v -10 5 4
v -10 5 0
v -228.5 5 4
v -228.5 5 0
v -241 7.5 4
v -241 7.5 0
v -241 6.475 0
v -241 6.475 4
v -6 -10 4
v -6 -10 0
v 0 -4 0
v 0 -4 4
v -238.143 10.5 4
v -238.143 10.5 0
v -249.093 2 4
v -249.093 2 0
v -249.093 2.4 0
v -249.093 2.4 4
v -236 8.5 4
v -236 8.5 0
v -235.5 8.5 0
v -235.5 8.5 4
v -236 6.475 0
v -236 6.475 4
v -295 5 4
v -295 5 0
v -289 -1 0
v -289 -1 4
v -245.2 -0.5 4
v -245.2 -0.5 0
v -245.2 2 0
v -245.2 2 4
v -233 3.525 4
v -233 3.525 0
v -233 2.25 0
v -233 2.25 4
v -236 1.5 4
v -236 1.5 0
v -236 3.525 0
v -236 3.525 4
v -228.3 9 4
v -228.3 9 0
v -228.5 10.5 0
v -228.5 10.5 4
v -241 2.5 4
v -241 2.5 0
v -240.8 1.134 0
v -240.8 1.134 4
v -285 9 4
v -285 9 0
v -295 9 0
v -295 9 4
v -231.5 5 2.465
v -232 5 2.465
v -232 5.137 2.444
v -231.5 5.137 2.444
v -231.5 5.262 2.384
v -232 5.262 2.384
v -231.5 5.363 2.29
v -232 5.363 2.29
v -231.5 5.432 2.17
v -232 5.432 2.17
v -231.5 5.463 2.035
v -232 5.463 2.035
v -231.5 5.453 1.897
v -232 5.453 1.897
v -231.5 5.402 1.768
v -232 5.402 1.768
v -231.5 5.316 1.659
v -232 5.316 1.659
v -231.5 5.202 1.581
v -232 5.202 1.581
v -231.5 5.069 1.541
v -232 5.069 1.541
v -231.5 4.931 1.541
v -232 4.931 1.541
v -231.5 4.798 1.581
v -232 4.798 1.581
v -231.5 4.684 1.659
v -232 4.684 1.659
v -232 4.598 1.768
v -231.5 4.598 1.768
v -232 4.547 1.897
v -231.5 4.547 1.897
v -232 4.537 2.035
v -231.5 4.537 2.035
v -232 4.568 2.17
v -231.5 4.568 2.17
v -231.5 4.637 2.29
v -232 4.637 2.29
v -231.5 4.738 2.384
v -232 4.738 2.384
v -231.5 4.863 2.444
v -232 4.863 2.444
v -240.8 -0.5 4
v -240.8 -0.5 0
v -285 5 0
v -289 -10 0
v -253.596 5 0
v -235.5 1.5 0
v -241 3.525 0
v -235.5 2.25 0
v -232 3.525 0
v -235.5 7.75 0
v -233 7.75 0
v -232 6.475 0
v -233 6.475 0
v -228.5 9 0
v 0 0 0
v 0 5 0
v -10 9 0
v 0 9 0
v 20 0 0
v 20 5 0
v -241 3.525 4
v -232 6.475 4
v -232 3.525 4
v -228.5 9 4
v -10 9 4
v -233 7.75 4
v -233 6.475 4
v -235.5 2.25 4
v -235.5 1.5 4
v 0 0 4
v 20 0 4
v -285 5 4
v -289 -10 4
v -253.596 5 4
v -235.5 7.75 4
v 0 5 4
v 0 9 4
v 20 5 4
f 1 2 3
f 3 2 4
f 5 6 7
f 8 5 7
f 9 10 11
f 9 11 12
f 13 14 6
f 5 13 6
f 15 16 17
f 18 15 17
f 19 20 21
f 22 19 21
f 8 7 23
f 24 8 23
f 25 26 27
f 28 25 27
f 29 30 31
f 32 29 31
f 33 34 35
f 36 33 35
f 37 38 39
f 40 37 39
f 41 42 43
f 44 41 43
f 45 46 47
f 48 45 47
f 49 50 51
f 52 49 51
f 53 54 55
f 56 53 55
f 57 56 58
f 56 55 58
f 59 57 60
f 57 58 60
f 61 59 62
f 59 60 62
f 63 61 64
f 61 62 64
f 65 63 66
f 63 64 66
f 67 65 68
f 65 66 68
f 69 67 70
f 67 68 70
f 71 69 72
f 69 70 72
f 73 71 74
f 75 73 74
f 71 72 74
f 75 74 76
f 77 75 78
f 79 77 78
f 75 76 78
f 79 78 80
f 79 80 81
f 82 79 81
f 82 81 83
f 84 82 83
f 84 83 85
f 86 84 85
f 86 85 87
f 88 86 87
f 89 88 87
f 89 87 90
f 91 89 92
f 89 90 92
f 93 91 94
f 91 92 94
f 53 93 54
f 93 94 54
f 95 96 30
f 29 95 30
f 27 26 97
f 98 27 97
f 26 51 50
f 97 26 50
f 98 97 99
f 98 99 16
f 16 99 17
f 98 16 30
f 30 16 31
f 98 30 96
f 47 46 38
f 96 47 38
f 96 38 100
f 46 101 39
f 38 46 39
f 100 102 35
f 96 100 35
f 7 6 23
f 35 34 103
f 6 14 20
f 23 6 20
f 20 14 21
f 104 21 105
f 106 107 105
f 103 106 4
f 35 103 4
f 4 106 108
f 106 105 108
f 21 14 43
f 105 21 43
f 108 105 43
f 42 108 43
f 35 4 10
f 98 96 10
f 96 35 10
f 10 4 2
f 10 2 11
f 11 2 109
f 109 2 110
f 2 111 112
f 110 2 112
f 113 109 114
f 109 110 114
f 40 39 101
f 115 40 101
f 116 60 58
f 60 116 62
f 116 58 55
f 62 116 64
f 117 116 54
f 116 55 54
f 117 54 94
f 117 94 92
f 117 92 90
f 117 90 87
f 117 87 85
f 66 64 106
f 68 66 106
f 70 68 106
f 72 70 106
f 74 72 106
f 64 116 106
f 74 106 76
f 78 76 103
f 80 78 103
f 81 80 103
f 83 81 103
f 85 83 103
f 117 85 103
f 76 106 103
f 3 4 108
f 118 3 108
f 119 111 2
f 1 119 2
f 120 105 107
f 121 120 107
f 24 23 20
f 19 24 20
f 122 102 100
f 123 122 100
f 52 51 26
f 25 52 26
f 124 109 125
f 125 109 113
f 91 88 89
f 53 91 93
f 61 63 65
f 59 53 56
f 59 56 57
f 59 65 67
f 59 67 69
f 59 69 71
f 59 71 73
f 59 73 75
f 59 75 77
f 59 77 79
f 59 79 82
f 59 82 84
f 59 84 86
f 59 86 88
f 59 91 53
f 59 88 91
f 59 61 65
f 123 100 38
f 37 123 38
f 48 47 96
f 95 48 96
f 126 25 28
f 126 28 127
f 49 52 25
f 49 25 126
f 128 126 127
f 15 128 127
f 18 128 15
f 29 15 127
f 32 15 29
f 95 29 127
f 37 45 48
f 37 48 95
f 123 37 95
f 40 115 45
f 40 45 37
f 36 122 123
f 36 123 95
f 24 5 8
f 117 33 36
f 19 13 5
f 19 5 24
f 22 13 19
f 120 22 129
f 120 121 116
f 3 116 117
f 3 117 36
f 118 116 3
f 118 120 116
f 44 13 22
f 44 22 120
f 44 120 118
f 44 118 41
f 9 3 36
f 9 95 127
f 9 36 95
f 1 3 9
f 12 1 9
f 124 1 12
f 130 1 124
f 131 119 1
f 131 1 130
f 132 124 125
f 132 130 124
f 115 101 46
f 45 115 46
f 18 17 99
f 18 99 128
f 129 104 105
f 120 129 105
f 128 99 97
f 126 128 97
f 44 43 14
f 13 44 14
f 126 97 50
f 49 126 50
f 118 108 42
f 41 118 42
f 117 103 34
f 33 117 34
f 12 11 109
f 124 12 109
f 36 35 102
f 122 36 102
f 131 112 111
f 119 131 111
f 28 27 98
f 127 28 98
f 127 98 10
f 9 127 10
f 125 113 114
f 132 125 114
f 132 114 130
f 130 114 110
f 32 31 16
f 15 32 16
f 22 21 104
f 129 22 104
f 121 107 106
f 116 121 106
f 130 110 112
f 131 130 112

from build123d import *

# Parameters (mm, degrees)
BOSS_EXTRUDE1_DEPTH = 4
CHAMFER1_SIZE       = 6
CHAMFER2_SIZE       = 2.6
CHAMFER2_SIZE2      = 4.5033321
SKETCH2_R           = 0.464535938
CUT_EXTRUDE1_DEPTH  = 0.5


with BuildPart() as part:
    # Sketch1 → Boss-Extrude1 (new body)
    with BuildSketch(Plane.XY):
        Polygon((0, 0), (20, 0), (20, 5), (0, 5), (0, 9), (-10, 9), (-10, 5), (-228.5, 5), (-228.5, 9), (-228.3, 9), (-228.5, 10.5), (-238.142857143, 10.5), (-241, 7.5), (-241, 6.475), (-236, 6.475), (-236, 8.5), (-235.5, 8.5), (-235.5, 7.75), (-233, 7.75), (-233, 6.475), (-232, 6.475), (-232, 3.525), (-233, 3.525), (-233, 2.25), (-235.5, 2.25), (-235.5, 1.5), (-236, 1.5), (-236, 3.525), (-241, 3.525), (-241, 2.5), (-240.8, 1.134476763), (-240.8, -0.5), (-245.2, -0.5), (-245.2, 2), (-249.093151184, 2), (-249.093151184, 5), (-285, 5), (-285, 9), (-295, 9), (-295, 5), (-289, -1), (-289, -10), (0, -10), align=None)
    extrude(amount=BOSS_EXTRUDE1_DEPTH)

    # Chamfer1
    chamfer1_edges = [part.edges().sort_by_distance(p)[0] for p in [
        (0, -10, 2),
    ]]
    chamfer(chamfer1_edges, length=CHAMFER1_SIZE)

    # Chamfer2
    chamfer2_edges = [part.edges().sort_by_distance(p)[0] for p in [
        (-249.093151184, 5, 2),
    ]]
    chamfer2_side = [part.faces().sort_by_distance(p)[0] for p in [
        (-249.093151184, 3.5, 2),
    ]]
    chamfer(chamfer2_edges, length=CHAMFER2_SIZE, length2=CHAMFER2_SIZE2, reference=chamfer2_side[0])

    # Sketch2 → Cut-Extrude1 (cut)
    with BuildSketch(Plane.ZY.offset(232)):
        with Locations((2, 5)):
            Circle(SKETCH2_R)
    extrude(amount=-CUT_EXTRUDE1_DEPTH, mode=Mode.SUBTRACT)


solid = part.part
